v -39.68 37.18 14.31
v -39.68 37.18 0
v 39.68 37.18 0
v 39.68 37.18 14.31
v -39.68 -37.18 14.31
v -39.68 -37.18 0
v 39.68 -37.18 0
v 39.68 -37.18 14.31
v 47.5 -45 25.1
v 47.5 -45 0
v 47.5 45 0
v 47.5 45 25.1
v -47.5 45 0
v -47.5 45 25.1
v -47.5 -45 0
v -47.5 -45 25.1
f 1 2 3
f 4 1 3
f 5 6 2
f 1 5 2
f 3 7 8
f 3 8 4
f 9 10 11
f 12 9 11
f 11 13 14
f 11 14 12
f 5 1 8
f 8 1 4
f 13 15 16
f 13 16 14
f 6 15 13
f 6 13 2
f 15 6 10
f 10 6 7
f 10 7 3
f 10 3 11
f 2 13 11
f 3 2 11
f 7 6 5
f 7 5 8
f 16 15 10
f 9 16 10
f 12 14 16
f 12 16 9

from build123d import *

# Parameters (mm, degrees)
SKETCH1_W                 = 95
SKETCH1_H                 = 90
BOSS_EXTRUDE1_DEPTH       = 25.1
SHELL1_T                  = -7.82
SHELL1_THICKNESS_2_FACE_W = 79.36
SHELL1_THICKNESS_2_FACE_H = 74.36
SHELL1_THICKNESS_2_DEPTH  = 2.97


with BuildPart() as part:
    # Sketch1 → Boss-Extrude1 (new body)
    with BuildSketch(Plane.XY):
        Rectangle(SKETCH1_W, SKETCH1_H)
    extrude(amount=BOSS_EXTRUDE1_DEPTH)

    # Shell1
    shell1_openings = [part.faces().sort_by_distance(p)[0] for p in [
        (0, 0, 0),
    ]]
    offset(amount=SHELL1_T, openings=shell1_openings, kind=Kind.INTERSECTION)

    # Shell1 thickness 2 face (on inner face of the shell) → Shell1 thickness 2 (add)
    with BuildSketch(Plane.XY.offset(17.28)):
        Rectangle(SHELL1_THICKNESS_2_FACE_W, SHELL1_THICKNESS_2_FACE_H)
    extrude(amount=-SHELL1_THICKNESS_2_DEPTH)


solid = part.part
